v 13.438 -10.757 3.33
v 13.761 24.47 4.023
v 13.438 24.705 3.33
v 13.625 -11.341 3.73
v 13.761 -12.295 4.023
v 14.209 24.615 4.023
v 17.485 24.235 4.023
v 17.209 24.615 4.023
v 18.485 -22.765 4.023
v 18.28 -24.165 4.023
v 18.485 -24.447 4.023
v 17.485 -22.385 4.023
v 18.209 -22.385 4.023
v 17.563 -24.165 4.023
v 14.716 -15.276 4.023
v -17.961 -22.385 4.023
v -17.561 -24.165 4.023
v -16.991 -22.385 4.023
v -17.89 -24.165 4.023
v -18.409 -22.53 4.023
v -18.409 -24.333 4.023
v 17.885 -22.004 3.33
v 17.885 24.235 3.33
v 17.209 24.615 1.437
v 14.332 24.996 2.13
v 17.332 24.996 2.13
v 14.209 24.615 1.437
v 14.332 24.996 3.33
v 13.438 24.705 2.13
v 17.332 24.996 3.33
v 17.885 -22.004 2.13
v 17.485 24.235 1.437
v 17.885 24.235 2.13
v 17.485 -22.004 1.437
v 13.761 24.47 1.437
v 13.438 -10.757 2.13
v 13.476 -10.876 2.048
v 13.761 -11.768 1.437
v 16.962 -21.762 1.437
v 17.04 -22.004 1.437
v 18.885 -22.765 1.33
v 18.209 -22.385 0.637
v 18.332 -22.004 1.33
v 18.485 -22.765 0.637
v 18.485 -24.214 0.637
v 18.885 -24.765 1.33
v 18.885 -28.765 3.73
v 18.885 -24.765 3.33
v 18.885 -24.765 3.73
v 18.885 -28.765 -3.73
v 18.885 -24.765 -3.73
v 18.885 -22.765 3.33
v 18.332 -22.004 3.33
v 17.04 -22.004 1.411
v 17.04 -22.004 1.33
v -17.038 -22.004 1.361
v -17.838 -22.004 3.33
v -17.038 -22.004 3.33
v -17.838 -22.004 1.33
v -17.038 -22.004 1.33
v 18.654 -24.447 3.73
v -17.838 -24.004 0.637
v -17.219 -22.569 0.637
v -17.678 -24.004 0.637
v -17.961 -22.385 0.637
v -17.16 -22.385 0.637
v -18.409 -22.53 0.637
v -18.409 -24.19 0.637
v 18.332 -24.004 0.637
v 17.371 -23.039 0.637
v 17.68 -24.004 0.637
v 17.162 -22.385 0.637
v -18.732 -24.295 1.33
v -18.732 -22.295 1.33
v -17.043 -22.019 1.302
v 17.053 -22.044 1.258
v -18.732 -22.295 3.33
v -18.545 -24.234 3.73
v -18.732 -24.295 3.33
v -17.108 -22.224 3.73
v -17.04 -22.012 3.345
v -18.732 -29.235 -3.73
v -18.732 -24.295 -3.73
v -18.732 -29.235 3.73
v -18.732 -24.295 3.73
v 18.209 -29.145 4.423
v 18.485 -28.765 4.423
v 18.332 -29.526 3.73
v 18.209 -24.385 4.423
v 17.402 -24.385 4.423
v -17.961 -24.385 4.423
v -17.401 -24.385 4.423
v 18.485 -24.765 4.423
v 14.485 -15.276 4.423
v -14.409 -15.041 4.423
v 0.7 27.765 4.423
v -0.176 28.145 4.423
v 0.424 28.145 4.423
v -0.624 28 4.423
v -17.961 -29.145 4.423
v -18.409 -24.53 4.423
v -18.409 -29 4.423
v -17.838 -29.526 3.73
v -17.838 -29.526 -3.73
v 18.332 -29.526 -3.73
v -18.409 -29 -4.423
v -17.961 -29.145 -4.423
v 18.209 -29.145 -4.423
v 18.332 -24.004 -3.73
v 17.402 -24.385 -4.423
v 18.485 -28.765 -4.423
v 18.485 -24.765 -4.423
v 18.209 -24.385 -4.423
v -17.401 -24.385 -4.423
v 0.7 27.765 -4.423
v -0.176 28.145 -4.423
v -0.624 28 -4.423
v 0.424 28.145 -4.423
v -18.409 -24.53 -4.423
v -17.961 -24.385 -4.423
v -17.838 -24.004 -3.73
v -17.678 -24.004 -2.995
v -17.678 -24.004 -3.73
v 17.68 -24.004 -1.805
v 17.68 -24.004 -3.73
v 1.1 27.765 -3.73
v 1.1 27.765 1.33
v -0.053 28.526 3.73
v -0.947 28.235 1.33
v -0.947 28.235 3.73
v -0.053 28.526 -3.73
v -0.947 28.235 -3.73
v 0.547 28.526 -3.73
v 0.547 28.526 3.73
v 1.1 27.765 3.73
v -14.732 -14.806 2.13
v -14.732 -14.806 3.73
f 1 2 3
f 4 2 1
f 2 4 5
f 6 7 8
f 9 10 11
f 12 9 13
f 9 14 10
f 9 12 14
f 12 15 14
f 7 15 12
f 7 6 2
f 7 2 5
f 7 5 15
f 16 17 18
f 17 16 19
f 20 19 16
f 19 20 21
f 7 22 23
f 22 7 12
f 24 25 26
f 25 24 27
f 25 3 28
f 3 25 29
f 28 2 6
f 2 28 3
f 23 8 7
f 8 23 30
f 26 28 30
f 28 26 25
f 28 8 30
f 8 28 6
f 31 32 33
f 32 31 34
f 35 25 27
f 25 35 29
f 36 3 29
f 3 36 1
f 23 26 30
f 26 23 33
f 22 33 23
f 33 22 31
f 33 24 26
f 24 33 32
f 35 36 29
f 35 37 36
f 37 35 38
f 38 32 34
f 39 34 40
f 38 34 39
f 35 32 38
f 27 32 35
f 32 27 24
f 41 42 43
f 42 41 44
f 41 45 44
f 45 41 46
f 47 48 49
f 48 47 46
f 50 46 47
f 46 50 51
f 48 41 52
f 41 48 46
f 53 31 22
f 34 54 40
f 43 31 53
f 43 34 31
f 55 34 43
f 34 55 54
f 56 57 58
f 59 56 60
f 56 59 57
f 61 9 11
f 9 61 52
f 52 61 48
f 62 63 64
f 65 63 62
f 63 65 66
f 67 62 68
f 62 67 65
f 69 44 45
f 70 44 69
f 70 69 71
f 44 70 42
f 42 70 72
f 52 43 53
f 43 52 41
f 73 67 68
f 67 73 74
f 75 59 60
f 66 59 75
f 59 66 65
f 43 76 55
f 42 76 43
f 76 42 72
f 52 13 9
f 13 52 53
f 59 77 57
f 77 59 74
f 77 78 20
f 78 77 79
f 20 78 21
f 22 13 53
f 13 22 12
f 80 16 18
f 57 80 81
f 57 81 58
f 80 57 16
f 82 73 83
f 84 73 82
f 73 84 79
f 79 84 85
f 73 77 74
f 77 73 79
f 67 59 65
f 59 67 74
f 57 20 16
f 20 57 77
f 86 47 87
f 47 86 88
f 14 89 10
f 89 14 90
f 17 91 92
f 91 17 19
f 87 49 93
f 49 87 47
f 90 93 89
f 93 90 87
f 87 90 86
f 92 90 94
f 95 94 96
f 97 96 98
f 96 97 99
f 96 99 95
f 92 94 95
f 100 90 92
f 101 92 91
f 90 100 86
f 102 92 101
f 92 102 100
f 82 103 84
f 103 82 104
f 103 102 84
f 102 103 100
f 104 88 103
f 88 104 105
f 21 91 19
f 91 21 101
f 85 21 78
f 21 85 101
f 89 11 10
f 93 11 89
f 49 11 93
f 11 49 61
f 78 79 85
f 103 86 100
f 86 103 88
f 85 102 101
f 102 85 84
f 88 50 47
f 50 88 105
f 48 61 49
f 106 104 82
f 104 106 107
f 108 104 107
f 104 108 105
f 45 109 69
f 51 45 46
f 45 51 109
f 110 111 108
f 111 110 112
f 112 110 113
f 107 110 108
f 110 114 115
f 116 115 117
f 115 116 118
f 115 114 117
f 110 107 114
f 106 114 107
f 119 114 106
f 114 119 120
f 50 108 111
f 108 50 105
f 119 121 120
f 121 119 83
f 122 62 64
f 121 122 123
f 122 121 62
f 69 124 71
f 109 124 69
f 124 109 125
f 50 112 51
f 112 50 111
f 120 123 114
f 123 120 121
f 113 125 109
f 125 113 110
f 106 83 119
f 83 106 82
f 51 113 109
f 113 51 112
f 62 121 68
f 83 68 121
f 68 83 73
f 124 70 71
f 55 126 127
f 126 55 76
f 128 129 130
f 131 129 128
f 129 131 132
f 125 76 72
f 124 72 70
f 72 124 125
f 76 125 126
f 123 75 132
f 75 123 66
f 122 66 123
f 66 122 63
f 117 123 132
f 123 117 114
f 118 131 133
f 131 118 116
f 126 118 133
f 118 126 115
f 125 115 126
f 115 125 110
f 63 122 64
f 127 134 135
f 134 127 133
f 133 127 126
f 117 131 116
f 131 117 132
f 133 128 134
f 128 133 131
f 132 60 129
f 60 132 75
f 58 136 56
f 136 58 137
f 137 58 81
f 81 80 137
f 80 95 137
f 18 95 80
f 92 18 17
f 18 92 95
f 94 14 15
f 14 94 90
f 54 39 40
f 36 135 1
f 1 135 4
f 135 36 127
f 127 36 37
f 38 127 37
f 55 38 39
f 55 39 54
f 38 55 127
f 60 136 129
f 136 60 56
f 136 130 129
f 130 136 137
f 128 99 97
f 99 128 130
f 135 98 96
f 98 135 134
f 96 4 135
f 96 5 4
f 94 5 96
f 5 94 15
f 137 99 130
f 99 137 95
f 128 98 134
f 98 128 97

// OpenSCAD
// Parameters
bbox_X = 36.17; //[18.085:72.34:0.01]
bbox_Y = 55.53; //[27.765:111.06:0.01]
bbox_Z = 8.66; //[4.33:17.32:0.01]
wedge_length_Y = 55.53; //[27.765:111.06:0.01]
wedge_width_X_max = 36.17; //[18.085:72.34:0.01]
wedge_thickness_Z_max = 8.66; //[4.33:17.32:0.01]
tip_width_X_min = 0.6; //[0.3:1.2:0.01]
tip_thickness_Z_min = 0.4; //[0.2:0.8:0.01]
flange_width_X = 3; //[1.5:6:0.01]
flange_step_height_Z = 1.2; //[0.6:2.4:0.01]
flange_length_Y = 50; //[25:100:0.01]
flange_offset_from_wide_end_Y = 2; //[1:4:0.01]
wide_end_endface_depth_Y = 4; //[2:8:0.01]
wide_end_shoulder_height_Z = 2; //[1:4:0.01]
wide_end_shoulder_length_Y = 6; //[3:12:0.01]
connect_overlap = 1; //[0.5:2:0.01]
chamfer_size = 0.6; //[0:1.2:0.01]
fillet_radius = 0.8; //[0:1.6:0.01]

// Base Shapes
module tapered_wedge_main_body() {
  linear_extrude(height=wedge_thickness_Z_max, center=true)
    polygon(points=[
      [-wedge_width_X_max/2, -wedge_length_Y/2],
      [wedge_width_X_max/2, -wedge_length_Y/2],
      [tip_width_X_min/2, wedge_length_Y/2],
      [-tip_width_X_min/2, wedge_length_Y/2]
    ]);
}

module sharp_tip_end() {
  linear_extrude(height=tip_thickness_Z_min, center=true)
    polygon(points=[
      [-tip_width_X_min/2, wedge_length_Y/2 - wide_end_endface_depth_Y],
      [tip_width_X_min/2, wedge_length_Y/2 - wide_end_endface_depth_Y],
      [tip_width_X_min/2, wedge_length_Y/2],
      [-tip_width_X_min/2, wedge_length_Y/2]
    ]);
}

module wide_end_perpendicular_end_face() {
  translate([0, -wedge_length_Y/2 + wide_end_endface_depth_Y/2 - connect_overlap, 0])
    cube([wedge_width_X_max, wide_end_endface_depth_Y, wedge_thickness_Z_max], center=true);
}

module longitudinal_step_flange_along_one_long_edge() {
  translate([wedge_width_X_max/2 - flange_width_X/2 - connect_overlap, -wedge_length_Y/2 + flange_offset_from_wide_end_Y + flange_length_Y/2, wedge_thickness_Z_max/2 - flange_step_height_Z/2 - connect_overlap])
    cube([flange_width_X, flange_length_Y, flange_step_height_Z], center=true);
}

module wide_end_L_profile_shoulder() {
  translate([0, -wedge_length_Y/2 + wide_end_shoulder_length_Y/2 - connect_overlap, wedge_thickness_Z_max/2 - wide_end_shoulder_height_Z/2 - connect_overlap])
    cube([wedge_width_X_max, wide_end_shoulder_length_Y, wide_end_shoulder_height_Z], center=true);
}

module edge_chamfers() {
  cube([wedge_width_X_max + 2*connect_overlap, wedge_length_Y + 2*connect_overlap, chamfer_size], center=true);
}

module edge_fillets() {
  sphere(r=fillet_radius, center=true);
}

module surface_text_or_markings() {
  translate([0, -wedge_length_Y/2 + connect_overlap, wedge_thickness_Z_max/2 - connect_overlap])
    cube([connect_overlap, connect_overlap, connect_overlap], center=true);
}

// Operations
module union_core_with_features() {
  union() {
    tapered_wedge_main_body();
    sharp_tip_end();
    wide_end_perpendicular_end_face();
    longitudinal_step_flange_along_one_long_edge();
    wide_end_L_profile_shoulder();
    surface_text_or_markings();
  }
}

module difference_apply_edge_chamfers() {
  difference() {
    union_core_with_features();
    translate([0, 0, wedge_thickness_Z_max/2 - chamfer_size/2]) edge_chamfers();
    translate([0, 0, -wedge_thickness_Z_max/2 + chamfer_size/2]) edge_chamfers();
  }
}

// Final Output
minkowski() {
  difference_apply_edge_chamfers();
  edge_fillets();
}
